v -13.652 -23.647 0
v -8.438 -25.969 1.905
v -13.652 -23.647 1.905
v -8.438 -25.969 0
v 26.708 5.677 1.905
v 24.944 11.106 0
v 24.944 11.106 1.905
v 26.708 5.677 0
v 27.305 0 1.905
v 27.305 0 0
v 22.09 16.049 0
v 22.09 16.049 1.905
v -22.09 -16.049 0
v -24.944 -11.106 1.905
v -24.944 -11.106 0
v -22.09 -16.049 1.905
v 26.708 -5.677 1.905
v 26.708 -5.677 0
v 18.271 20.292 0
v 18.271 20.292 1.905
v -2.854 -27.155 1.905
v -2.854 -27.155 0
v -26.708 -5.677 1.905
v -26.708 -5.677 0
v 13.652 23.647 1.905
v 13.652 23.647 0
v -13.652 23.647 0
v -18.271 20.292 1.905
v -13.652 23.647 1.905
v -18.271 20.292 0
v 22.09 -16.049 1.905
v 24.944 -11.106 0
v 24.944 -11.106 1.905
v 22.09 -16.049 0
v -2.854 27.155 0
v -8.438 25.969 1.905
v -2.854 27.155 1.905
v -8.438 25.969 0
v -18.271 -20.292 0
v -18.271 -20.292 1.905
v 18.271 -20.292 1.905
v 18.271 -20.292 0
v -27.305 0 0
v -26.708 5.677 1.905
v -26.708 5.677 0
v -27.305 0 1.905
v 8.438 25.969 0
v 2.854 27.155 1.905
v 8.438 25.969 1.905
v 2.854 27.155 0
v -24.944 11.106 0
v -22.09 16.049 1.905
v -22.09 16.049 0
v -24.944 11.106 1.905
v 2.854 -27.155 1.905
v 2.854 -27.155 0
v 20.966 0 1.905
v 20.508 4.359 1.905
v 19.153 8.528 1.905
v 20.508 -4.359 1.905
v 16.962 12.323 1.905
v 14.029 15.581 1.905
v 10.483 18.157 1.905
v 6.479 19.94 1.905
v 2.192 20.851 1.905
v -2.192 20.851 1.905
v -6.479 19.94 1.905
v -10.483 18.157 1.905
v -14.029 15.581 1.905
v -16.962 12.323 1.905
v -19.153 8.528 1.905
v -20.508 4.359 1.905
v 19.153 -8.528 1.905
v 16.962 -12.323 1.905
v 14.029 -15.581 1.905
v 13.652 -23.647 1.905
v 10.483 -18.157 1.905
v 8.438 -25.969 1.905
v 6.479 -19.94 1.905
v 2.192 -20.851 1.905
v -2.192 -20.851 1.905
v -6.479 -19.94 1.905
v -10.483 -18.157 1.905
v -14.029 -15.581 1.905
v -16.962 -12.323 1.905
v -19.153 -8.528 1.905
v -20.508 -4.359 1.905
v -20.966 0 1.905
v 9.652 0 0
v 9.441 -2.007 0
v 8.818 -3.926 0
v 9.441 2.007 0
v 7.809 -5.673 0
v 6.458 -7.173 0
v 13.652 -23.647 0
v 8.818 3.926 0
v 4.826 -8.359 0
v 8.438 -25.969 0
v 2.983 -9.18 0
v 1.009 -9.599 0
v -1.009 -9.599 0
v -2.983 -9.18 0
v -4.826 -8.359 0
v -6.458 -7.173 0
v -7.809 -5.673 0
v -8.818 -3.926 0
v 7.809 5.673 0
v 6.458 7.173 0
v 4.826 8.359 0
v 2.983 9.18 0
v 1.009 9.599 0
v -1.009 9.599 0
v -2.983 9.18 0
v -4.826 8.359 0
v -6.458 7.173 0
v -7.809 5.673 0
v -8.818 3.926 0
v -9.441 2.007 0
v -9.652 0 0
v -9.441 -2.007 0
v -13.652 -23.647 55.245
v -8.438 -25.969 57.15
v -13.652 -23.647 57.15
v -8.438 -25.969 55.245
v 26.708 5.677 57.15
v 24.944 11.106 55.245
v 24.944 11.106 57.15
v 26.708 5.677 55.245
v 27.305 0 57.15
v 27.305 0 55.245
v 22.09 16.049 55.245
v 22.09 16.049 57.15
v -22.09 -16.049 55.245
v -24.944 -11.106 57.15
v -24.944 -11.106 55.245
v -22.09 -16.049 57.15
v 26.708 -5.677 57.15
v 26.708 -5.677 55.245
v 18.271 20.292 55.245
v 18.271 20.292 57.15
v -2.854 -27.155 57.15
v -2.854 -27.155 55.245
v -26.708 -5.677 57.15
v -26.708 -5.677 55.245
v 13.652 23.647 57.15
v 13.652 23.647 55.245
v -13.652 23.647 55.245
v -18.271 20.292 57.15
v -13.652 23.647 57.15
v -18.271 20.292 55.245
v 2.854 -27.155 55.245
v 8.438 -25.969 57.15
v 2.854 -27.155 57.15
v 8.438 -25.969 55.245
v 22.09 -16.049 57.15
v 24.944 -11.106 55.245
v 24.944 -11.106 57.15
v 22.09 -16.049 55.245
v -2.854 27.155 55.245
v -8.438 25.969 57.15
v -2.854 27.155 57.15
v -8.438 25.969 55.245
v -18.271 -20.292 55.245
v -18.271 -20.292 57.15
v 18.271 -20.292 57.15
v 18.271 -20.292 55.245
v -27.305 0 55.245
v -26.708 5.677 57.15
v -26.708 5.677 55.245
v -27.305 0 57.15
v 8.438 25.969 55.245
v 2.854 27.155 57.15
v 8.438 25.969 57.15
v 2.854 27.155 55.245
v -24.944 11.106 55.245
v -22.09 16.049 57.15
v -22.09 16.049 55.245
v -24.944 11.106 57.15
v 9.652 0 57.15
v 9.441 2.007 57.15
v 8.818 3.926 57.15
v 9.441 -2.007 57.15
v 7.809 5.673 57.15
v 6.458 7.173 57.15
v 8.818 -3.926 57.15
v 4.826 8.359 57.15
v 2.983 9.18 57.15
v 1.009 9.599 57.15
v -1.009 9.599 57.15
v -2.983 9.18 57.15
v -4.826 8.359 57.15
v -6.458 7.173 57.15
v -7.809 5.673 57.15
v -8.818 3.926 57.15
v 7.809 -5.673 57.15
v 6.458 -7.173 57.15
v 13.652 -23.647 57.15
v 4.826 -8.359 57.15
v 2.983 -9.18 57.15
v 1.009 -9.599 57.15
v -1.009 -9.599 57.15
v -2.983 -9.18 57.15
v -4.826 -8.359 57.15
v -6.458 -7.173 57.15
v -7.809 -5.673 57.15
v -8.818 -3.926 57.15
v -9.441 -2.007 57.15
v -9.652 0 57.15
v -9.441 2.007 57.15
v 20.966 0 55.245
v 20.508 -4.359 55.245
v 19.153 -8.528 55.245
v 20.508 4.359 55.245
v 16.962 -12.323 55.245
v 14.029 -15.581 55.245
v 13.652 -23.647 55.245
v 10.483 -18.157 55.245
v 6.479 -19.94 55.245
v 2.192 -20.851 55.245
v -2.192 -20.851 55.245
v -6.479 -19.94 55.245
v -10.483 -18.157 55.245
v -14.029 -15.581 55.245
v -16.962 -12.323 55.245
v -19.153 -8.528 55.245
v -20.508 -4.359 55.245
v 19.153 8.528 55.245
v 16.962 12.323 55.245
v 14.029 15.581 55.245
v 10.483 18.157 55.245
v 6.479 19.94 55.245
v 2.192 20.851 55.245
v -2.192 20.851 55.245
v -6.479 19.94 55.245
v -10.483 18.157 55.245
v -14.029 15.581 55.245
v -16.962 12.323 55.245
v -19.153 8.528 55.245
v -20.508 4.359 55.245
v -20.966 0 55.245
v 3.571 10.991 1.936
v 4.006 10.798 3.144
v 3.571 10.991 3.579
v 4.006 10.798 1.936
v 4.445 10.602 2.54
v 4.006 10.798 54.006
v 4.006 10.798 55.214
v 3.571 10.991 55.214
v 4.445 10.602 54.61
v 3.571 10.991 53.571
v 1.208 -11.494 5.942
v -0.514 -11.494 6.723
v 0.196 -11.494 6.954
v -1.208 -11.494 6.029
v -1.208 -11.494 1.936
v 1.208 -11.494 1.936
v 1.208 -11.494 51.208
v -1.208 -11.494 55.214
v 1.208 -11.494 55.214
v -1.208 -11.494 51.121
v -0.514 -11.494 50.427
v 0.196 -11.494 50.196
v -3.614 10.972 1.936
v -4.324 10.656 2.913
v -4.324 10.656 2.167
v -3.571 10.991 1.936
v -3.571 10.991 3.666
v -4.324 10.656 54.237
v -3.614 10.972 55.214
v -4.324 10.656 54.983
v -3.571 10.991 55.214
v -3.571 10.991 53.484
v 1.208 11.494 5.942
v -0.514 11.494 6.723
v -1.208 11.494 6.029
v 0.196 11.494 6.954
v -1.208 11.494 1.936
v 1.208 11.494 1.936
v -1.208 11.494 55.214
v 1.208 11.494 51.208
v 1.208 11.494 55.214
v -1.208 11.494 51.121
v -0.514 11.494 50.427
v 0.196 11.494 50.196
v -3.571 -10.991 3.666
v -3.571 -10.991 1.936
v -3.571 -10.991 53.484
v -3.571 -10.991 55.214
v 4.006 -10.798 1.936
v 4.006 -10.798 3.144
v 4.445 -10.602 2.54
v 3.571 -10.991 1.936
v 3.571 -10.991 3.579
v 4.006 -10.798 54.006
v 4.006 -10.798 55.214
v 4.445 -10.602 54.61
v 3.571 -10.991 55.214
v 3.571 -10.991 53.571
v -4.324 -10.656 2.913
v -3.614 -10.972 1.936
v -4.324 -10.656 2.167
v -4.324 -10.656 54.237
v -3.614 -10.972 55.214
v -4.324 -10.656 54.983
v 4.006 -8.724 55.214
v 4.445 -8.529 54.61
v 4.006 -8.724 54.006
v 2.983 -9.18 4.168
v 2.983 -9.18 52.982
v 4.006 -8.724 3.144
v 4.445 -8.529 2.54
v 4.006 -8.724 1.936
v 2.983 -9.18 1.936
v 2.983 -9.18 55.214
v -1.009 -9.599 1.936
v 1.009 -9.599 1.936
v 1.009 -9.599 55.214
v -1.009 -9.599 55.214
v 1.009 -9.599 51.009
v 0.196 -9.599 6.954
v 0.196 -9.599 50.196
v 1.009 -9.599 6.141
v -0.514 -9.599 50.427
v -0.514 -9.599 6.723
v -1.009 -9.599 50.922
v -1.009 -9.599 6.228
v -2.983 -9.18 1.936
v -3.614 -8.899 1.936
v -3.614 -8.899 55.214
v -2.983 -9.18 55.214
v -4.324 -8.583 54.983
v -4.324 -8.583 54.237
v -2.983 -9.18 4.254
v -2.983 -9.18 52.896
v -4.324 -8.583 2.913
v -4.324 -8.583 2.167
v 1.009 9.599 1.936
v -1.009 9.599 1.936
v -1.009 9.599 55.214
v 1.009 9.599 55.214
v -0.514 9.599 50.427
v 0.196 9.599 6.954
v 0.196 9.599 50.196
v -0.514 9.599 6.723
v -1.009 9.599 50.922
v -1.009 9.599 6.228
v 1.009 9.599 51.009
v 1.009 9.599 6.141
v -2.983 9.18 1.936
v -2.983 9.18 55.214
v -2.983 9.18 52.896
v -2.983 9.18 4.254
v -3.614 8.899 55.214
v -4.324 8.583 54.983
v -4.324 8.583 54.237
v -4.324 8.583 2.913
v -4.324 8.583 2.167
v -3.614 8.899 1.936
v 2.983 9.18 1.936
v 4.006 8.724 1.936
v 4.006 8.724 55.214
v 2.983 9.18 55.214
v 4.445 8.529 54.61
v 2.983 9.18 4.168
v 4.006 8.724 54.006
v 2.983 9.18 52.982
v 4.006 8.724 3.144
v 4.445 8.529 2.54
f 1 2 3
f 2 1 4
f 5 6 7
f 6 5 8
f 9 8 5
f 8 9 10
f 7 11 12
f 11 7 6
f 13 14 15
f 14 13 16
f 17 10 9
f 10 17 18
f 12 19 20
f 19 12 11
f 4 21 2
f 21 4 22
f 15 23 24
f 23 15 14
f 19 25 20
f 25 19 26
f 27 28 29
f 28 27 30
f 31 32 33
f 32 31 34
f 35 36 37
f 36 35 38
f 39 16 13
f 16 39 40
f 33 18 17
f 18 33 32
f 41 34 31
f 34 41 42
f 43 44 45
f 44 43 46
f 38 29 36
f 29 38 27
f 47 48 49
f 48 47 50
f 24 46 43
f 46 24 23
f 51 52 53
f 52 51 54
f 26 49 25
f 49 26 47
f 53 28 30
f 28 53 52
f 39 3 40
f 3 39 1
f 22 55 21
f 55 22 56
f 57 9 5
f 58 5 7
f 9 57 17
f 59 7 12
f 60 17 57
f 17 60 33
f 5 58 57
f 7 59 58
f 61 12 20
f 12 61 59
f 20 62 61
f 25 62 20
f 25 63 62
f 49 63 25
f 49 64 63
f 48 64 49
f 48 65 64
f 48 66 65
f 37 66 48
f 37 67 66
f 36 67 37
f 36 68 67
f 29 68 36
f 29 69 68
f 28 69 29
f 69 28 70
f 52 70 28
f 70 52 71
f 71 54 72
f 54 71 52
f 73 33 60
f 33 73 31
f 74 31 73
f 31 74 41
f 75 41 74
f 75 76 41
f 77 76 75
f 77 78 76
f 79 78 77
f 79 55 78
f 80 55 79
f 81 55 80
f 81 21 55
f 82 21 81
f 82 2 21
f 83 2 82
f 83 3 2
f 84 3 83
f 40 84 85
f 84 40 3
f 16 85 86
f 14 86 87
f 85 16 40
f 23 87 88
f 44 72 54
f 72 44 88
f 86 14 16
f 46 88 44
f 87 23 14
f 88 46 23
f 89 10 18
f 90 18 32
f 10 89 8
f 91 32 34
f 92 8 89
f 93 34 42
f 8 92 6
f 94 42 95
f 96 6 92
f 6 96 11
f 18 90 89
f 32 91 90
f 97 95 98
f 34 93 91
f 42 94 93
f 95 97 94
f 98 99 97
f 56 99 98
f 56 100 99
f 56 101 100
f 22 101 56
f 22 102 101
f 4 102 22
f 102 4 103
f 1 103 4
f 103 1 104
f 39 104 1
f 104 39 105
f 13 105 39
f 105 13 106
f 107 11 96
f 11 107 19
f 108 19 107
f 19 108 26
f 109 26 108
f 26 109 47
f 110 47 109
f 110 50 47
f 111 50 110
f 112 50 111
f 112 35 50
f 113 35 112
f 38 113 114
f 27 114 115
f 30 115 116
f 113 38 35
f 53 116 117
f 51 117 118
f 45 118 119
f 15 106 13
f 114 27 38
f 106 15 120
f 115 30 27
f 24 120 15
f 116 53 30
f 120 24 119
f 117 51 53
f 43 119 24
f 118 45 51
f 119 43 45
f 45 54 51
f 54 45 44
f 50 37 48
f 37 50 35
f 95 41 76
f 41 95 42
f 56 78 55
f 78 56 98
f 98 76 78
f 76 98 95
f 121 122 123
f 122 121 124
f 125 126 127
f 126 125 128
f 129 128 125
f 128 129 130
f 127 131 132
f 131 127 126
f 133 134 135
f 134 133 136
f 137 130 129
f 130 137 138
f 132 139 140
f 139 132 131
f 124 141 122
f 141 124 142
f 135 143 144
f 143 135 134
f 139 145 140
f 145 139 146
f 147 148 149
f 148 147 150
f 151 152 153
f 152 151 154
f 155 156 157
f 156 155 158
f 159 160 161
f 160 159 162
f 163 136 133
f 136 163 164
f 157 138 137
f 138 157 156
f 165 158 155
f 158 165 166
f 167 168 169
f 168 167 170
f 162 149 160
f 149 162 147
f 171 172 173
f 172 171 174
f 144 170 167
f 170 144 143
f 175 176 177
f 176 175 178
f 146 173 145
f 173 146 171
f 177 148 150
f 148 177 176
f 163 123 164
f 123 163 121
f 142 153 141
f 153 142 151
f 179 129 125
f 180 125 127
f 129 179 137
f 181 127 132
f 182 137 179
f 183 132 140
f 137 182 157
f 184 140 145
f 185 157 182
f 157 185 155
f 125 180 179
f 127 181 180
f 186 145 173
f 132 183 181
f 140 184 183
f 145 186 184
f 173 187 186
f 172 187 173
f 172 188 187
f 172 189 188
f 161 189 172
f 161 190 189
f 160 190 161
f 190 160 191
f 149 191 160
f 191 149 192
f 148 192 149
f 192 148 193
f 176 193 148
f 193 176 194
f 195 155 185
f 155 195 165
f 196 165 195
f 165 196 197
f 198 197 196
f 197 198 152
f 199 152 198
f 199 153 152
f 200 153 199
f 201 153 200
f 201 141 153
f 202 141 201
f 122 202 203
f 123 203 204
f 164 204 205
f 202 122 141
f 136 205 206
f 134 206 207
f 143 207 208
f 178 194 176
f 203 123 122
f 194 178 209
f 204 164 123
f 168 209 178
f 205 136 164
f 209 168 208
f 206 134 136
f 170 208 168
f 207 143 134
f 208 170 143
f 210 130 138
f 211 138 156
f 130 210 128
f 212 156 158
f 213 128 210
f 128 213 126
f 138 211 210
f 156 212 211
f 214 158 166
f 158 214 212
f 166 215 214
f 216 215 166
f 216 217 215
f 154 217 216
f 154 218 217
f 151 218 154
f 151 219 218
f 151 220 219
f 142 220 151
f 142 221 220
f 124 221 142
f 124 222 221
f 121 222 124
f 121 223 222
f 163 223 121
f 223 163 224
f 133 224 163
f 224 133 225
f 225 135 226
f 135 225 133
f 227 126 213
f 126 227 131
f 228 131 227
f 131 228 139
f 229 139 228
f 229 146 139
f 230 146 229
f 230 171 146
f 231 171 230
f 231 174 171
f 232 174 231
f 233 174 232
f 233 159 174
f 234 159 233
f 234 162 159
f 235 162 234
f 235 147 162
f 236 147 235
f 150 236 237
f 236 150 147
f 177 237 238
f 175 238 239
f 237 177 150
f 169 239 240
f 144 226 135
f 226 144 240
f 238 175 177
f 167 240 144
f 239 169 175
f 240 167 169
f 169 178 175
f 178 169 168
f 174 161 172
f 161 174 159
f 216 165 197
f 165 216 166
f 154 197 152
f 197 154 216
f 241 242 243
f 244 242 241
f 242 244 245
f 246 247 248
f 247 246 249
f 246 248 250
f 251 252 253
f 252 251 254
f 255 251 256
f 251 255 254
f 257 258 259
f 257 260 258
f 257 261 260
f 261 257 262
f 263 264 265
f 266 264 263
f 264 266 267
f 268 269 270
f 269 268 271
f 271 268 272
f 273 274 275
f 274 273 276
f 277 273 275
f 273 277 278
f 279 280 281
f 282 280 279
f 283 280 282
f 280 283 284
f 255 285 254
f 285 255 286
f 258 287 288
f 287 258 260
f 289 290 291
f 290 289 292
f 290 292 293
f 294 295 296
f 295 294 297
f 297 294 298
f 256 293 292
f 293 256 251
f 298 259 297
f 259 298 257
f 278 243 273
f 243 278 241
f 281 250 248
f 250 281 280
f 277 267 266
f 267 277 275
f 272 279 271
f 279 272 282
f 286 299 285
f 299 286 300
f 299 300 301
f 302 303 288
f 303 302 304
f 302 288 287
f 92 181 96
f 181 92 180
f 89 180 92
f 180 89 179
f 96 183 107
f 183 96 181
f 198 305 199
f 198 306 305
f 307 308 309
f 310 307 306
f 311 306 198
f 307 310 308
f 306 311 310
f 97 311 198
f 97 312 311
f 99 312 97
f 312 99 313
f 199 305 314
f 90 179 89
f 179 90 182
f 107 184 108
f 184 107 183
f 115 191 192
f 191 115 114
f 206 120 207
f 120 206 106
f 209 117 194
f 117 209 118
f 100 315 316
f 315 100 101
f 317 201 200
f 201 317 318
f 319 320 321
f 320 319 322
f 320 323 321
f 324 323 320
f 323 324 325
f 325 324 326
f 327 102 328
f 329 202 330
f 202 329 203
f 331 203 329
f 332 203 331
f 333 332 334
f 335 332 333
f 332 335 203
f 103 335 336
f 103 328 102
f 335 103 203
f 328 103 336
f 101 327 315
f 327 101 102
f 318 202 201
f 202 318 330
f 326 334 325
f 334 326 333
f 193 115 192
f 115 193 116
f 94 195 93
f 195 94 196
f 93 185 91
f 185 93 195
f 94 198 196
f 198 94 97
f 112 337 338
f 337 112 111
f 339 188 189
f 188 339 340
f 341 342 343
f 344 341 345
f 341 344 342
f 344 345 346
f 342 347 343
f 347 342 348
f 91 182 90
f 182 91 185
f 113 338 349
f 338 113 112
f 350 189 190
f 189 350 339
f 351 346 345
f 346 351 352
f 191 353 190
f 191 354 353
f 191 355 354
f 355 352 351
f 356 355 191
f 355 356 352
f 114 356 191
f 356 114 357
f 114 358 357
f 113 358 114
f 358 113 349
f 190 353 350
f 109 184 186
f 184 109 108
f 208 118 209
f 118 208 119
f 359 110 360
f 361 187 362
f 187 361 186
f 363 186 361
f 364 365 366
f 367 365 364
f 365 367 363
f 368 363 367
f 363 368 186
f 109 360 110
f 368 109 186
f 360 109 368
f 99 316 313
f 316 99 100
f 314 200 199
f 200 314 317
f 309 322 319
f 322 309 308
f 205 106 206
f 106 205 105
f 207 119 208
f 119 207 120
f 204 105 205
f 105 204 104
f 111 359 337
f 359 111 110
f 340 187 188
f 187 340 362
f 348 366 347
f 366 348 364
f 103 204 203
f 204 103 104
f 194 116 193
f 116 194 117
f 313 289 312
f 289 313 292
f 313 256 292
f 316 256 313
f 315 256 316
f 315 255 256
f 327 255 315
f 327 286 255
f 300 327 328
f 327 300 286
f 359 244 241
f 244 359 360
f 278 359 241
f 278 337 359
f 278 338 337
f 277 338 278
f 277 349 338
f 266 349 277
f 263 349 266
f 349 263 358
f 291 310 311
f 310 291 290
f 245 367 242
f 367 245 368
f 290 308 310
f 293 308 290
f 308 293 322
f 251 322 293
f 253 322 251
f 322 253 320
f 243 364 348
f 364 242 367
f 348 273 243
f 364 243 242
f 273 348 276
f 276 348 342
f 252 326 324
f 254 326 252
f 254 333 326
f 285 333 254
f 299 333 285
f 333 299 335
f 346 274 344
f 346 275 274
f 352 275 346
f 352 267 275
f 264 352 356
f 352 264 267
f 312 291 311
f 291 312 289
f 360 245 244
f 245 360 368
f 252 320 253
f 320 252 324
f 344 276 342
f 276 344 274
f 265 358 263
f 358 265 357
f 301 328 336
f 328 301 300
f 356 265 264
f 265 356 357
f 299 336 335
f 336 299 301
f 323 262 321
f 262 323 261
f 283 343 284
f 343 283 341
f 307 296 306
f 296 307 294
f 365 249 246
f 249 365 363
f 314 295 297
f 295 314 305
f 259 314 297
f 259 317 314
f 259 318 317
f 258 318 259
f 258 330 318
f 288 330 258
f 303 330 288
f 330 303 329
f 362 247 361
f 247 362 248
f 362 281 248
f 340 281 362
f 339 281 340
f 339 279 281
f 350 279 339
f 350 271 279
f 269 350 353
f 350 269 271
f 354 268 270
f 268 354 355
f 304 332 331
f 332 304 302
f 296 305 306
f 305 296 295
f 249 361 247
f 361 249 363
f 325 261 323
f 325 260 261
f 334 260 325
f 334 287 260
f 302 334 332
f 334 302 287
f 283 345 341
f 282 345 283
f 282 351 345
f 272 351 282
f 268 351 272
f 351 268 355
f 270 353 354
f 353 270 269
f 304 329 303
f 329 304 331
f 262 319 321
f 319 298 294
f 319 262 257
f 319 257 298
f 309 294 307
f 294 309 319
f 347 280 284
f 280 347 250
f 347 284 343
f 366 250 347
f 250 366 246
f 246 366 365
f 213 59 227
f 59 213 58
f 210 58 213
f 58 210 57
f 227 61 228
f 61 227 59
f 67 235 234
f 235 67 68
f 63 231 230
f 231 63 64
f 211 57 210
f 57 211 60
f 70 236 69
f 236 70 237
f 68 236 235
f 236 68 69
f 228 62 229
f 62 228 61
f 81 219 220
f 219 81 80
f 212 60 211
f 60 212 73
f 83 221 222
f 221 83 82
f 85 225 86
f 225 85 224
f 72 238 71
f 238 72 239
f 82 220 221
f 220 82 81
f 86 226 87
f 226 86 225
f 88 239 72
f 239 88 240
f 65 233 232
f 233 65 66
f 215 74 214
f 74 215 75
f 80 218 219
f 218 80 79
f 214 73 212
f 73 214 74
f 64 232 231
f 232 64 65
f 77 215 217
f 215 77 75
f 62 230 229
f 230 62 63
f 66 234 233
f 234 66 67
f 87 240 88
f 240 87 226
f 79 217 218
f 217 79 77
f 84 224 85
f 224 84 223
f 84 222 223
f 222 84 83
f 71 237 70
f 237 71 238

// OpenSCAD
inch = 25.4;

module _solder_spool(h, r, ir, sr, thickness, tr, th) {
	// Spool
	color([.9, .9, .9])
	difference() {
		// Body
		union() {
			cylinder(h = thickness, r = r);

			translate([0, 0, h - thickness])
			cylinder(h = thickness, r = r);

			translate([0, 0, thickness])
			cylinder(h = h - 2*thickness, r = ir + thickness);
		}

		// Cut the hole through the middle
		translate([0, 0, -0.5*inch])
		cylinder(h = h + 1*inch, r = ir);

		// Bottom triangles
		hull() {
			translate([0, 0, thickness + tr + th])
			rotate([90, 0, 0])
			cylinder(r = tr, h = 2*ir + 1*inch, center = true);

			translate([th, 0, thickness + tr])
			rotate([90, 0, 0])
			cylinder(r = tr, h = 2*ir + 1*inch, center = true);

			translate([-th, 0, thickness + tr])
			rotate([90, 0, 0])
			cylinder(r = tr, h = 2*ir + 1*inch, center = true);
		}

		// Top triangles
		hull() {
			translate([0, 0, h - thickness - tr - th])
			rotate([90, 0, 0])
			cylinder(r = tr, h = 2*ir + 1*inch, center = true);

			translate([th, 0, h - thickness - tr])
			rotate([90, 0, 0])
			cylinder(r = tr, h = 2*ir + 1*inch, center = true);

			translate([-th, 0, h - thickness - tr])
			rotate([90, 0, 0])
			cylinder(r = tr, h = 2*ir + 1*inch, center = true);
		}
	}

	// Solder
	color([.6, .6, .5])
	difference() {
		translate([0, 0, thickness])
		cylinder(h = h - 2*thickness, r = sr);

		translate([0, 0, -0.5*inch])
		cylinder(h = h + 1*inch, r = ir + thickness);
	}
}

module solder_spool(h = 2.25*inch, r = 1.075*inch, ir = 0.38*inch,
                    sr = -3735928559, thickness = 0.075*inch, tr = 0.025*inch,
                    th = 0.15*inch, center = false) {
	default_sr = sqrt(r*r/2 + (ir+thickness)*(ir+thickness)/2);
	if (center) {
		translate([0, 0, -h/2]) {
			if (sr == -3735928559) {
				_solder_spool(h = h, r = r, ir = ir, sr = default_sr,
				              thickness = thickness, tr = tr, th = th);
			} else {
				_solder_spool(h = h, r = r, ir = ir, sr = sr,
				              thickness = thickness, tr = tr, th = th);
			}
		}
	} else {
		if (sr == -3735928559) {
			_solder_spool(h = h, r = r, ir = ir, sr = default_sr,
			              thickness = thickness, tr = tr, th = th);
		} else {
			_solder_spool(h = h, r = r, ir = ir, sr = sr,
			              thickness = thickness, tr = tr, th = th);
		}
	}
}

solder_spool();
